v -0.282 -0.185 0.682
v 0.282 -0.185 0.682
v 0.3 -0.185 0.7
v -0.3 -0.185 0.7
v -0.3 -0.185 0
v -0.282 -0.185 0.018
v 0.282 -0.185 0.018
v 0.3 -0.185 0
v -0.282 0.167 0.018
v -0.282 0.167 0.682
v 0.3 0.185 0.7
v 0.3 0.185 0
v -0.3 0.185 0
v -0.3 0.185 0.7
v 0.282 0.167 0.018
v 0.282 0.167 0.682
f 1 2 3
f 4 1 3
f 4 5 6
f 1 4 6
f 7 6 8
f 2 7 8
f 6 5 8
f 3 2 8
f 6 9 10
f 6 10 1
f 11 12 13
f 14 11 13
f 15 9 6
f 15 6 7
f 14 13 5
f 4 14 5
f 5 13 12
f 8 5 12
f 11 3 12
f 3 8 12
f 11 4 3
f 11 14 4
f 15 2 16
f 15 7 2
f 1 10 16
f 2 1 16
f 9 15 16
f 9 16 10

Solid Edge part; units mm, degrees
sketch "Sketch1" plane through (0, 0, 0) normal (0, 0, 1) x (1, 0, 0)
  line L0 (-0.3, -0.185) -> (0.3, -0.185)
  line L1 (0.3, -0.185) -> (0.3, 0.185)
  line L2 (0.3, 0.185) -> (-0.3, 0.185)
  line L3 (-0.3, 0.185) -> (-0.3, -0.185)
  dimension "D1" = 0.6
  dimension "D2" = 0.37
extrude "Protrusion1" add sketch "Sketch1" along normal blind 0.7
shell "Dünnwand_1" thickness 0.018 removed faces 1 at (-0.206, -0.185, 0.5763)
